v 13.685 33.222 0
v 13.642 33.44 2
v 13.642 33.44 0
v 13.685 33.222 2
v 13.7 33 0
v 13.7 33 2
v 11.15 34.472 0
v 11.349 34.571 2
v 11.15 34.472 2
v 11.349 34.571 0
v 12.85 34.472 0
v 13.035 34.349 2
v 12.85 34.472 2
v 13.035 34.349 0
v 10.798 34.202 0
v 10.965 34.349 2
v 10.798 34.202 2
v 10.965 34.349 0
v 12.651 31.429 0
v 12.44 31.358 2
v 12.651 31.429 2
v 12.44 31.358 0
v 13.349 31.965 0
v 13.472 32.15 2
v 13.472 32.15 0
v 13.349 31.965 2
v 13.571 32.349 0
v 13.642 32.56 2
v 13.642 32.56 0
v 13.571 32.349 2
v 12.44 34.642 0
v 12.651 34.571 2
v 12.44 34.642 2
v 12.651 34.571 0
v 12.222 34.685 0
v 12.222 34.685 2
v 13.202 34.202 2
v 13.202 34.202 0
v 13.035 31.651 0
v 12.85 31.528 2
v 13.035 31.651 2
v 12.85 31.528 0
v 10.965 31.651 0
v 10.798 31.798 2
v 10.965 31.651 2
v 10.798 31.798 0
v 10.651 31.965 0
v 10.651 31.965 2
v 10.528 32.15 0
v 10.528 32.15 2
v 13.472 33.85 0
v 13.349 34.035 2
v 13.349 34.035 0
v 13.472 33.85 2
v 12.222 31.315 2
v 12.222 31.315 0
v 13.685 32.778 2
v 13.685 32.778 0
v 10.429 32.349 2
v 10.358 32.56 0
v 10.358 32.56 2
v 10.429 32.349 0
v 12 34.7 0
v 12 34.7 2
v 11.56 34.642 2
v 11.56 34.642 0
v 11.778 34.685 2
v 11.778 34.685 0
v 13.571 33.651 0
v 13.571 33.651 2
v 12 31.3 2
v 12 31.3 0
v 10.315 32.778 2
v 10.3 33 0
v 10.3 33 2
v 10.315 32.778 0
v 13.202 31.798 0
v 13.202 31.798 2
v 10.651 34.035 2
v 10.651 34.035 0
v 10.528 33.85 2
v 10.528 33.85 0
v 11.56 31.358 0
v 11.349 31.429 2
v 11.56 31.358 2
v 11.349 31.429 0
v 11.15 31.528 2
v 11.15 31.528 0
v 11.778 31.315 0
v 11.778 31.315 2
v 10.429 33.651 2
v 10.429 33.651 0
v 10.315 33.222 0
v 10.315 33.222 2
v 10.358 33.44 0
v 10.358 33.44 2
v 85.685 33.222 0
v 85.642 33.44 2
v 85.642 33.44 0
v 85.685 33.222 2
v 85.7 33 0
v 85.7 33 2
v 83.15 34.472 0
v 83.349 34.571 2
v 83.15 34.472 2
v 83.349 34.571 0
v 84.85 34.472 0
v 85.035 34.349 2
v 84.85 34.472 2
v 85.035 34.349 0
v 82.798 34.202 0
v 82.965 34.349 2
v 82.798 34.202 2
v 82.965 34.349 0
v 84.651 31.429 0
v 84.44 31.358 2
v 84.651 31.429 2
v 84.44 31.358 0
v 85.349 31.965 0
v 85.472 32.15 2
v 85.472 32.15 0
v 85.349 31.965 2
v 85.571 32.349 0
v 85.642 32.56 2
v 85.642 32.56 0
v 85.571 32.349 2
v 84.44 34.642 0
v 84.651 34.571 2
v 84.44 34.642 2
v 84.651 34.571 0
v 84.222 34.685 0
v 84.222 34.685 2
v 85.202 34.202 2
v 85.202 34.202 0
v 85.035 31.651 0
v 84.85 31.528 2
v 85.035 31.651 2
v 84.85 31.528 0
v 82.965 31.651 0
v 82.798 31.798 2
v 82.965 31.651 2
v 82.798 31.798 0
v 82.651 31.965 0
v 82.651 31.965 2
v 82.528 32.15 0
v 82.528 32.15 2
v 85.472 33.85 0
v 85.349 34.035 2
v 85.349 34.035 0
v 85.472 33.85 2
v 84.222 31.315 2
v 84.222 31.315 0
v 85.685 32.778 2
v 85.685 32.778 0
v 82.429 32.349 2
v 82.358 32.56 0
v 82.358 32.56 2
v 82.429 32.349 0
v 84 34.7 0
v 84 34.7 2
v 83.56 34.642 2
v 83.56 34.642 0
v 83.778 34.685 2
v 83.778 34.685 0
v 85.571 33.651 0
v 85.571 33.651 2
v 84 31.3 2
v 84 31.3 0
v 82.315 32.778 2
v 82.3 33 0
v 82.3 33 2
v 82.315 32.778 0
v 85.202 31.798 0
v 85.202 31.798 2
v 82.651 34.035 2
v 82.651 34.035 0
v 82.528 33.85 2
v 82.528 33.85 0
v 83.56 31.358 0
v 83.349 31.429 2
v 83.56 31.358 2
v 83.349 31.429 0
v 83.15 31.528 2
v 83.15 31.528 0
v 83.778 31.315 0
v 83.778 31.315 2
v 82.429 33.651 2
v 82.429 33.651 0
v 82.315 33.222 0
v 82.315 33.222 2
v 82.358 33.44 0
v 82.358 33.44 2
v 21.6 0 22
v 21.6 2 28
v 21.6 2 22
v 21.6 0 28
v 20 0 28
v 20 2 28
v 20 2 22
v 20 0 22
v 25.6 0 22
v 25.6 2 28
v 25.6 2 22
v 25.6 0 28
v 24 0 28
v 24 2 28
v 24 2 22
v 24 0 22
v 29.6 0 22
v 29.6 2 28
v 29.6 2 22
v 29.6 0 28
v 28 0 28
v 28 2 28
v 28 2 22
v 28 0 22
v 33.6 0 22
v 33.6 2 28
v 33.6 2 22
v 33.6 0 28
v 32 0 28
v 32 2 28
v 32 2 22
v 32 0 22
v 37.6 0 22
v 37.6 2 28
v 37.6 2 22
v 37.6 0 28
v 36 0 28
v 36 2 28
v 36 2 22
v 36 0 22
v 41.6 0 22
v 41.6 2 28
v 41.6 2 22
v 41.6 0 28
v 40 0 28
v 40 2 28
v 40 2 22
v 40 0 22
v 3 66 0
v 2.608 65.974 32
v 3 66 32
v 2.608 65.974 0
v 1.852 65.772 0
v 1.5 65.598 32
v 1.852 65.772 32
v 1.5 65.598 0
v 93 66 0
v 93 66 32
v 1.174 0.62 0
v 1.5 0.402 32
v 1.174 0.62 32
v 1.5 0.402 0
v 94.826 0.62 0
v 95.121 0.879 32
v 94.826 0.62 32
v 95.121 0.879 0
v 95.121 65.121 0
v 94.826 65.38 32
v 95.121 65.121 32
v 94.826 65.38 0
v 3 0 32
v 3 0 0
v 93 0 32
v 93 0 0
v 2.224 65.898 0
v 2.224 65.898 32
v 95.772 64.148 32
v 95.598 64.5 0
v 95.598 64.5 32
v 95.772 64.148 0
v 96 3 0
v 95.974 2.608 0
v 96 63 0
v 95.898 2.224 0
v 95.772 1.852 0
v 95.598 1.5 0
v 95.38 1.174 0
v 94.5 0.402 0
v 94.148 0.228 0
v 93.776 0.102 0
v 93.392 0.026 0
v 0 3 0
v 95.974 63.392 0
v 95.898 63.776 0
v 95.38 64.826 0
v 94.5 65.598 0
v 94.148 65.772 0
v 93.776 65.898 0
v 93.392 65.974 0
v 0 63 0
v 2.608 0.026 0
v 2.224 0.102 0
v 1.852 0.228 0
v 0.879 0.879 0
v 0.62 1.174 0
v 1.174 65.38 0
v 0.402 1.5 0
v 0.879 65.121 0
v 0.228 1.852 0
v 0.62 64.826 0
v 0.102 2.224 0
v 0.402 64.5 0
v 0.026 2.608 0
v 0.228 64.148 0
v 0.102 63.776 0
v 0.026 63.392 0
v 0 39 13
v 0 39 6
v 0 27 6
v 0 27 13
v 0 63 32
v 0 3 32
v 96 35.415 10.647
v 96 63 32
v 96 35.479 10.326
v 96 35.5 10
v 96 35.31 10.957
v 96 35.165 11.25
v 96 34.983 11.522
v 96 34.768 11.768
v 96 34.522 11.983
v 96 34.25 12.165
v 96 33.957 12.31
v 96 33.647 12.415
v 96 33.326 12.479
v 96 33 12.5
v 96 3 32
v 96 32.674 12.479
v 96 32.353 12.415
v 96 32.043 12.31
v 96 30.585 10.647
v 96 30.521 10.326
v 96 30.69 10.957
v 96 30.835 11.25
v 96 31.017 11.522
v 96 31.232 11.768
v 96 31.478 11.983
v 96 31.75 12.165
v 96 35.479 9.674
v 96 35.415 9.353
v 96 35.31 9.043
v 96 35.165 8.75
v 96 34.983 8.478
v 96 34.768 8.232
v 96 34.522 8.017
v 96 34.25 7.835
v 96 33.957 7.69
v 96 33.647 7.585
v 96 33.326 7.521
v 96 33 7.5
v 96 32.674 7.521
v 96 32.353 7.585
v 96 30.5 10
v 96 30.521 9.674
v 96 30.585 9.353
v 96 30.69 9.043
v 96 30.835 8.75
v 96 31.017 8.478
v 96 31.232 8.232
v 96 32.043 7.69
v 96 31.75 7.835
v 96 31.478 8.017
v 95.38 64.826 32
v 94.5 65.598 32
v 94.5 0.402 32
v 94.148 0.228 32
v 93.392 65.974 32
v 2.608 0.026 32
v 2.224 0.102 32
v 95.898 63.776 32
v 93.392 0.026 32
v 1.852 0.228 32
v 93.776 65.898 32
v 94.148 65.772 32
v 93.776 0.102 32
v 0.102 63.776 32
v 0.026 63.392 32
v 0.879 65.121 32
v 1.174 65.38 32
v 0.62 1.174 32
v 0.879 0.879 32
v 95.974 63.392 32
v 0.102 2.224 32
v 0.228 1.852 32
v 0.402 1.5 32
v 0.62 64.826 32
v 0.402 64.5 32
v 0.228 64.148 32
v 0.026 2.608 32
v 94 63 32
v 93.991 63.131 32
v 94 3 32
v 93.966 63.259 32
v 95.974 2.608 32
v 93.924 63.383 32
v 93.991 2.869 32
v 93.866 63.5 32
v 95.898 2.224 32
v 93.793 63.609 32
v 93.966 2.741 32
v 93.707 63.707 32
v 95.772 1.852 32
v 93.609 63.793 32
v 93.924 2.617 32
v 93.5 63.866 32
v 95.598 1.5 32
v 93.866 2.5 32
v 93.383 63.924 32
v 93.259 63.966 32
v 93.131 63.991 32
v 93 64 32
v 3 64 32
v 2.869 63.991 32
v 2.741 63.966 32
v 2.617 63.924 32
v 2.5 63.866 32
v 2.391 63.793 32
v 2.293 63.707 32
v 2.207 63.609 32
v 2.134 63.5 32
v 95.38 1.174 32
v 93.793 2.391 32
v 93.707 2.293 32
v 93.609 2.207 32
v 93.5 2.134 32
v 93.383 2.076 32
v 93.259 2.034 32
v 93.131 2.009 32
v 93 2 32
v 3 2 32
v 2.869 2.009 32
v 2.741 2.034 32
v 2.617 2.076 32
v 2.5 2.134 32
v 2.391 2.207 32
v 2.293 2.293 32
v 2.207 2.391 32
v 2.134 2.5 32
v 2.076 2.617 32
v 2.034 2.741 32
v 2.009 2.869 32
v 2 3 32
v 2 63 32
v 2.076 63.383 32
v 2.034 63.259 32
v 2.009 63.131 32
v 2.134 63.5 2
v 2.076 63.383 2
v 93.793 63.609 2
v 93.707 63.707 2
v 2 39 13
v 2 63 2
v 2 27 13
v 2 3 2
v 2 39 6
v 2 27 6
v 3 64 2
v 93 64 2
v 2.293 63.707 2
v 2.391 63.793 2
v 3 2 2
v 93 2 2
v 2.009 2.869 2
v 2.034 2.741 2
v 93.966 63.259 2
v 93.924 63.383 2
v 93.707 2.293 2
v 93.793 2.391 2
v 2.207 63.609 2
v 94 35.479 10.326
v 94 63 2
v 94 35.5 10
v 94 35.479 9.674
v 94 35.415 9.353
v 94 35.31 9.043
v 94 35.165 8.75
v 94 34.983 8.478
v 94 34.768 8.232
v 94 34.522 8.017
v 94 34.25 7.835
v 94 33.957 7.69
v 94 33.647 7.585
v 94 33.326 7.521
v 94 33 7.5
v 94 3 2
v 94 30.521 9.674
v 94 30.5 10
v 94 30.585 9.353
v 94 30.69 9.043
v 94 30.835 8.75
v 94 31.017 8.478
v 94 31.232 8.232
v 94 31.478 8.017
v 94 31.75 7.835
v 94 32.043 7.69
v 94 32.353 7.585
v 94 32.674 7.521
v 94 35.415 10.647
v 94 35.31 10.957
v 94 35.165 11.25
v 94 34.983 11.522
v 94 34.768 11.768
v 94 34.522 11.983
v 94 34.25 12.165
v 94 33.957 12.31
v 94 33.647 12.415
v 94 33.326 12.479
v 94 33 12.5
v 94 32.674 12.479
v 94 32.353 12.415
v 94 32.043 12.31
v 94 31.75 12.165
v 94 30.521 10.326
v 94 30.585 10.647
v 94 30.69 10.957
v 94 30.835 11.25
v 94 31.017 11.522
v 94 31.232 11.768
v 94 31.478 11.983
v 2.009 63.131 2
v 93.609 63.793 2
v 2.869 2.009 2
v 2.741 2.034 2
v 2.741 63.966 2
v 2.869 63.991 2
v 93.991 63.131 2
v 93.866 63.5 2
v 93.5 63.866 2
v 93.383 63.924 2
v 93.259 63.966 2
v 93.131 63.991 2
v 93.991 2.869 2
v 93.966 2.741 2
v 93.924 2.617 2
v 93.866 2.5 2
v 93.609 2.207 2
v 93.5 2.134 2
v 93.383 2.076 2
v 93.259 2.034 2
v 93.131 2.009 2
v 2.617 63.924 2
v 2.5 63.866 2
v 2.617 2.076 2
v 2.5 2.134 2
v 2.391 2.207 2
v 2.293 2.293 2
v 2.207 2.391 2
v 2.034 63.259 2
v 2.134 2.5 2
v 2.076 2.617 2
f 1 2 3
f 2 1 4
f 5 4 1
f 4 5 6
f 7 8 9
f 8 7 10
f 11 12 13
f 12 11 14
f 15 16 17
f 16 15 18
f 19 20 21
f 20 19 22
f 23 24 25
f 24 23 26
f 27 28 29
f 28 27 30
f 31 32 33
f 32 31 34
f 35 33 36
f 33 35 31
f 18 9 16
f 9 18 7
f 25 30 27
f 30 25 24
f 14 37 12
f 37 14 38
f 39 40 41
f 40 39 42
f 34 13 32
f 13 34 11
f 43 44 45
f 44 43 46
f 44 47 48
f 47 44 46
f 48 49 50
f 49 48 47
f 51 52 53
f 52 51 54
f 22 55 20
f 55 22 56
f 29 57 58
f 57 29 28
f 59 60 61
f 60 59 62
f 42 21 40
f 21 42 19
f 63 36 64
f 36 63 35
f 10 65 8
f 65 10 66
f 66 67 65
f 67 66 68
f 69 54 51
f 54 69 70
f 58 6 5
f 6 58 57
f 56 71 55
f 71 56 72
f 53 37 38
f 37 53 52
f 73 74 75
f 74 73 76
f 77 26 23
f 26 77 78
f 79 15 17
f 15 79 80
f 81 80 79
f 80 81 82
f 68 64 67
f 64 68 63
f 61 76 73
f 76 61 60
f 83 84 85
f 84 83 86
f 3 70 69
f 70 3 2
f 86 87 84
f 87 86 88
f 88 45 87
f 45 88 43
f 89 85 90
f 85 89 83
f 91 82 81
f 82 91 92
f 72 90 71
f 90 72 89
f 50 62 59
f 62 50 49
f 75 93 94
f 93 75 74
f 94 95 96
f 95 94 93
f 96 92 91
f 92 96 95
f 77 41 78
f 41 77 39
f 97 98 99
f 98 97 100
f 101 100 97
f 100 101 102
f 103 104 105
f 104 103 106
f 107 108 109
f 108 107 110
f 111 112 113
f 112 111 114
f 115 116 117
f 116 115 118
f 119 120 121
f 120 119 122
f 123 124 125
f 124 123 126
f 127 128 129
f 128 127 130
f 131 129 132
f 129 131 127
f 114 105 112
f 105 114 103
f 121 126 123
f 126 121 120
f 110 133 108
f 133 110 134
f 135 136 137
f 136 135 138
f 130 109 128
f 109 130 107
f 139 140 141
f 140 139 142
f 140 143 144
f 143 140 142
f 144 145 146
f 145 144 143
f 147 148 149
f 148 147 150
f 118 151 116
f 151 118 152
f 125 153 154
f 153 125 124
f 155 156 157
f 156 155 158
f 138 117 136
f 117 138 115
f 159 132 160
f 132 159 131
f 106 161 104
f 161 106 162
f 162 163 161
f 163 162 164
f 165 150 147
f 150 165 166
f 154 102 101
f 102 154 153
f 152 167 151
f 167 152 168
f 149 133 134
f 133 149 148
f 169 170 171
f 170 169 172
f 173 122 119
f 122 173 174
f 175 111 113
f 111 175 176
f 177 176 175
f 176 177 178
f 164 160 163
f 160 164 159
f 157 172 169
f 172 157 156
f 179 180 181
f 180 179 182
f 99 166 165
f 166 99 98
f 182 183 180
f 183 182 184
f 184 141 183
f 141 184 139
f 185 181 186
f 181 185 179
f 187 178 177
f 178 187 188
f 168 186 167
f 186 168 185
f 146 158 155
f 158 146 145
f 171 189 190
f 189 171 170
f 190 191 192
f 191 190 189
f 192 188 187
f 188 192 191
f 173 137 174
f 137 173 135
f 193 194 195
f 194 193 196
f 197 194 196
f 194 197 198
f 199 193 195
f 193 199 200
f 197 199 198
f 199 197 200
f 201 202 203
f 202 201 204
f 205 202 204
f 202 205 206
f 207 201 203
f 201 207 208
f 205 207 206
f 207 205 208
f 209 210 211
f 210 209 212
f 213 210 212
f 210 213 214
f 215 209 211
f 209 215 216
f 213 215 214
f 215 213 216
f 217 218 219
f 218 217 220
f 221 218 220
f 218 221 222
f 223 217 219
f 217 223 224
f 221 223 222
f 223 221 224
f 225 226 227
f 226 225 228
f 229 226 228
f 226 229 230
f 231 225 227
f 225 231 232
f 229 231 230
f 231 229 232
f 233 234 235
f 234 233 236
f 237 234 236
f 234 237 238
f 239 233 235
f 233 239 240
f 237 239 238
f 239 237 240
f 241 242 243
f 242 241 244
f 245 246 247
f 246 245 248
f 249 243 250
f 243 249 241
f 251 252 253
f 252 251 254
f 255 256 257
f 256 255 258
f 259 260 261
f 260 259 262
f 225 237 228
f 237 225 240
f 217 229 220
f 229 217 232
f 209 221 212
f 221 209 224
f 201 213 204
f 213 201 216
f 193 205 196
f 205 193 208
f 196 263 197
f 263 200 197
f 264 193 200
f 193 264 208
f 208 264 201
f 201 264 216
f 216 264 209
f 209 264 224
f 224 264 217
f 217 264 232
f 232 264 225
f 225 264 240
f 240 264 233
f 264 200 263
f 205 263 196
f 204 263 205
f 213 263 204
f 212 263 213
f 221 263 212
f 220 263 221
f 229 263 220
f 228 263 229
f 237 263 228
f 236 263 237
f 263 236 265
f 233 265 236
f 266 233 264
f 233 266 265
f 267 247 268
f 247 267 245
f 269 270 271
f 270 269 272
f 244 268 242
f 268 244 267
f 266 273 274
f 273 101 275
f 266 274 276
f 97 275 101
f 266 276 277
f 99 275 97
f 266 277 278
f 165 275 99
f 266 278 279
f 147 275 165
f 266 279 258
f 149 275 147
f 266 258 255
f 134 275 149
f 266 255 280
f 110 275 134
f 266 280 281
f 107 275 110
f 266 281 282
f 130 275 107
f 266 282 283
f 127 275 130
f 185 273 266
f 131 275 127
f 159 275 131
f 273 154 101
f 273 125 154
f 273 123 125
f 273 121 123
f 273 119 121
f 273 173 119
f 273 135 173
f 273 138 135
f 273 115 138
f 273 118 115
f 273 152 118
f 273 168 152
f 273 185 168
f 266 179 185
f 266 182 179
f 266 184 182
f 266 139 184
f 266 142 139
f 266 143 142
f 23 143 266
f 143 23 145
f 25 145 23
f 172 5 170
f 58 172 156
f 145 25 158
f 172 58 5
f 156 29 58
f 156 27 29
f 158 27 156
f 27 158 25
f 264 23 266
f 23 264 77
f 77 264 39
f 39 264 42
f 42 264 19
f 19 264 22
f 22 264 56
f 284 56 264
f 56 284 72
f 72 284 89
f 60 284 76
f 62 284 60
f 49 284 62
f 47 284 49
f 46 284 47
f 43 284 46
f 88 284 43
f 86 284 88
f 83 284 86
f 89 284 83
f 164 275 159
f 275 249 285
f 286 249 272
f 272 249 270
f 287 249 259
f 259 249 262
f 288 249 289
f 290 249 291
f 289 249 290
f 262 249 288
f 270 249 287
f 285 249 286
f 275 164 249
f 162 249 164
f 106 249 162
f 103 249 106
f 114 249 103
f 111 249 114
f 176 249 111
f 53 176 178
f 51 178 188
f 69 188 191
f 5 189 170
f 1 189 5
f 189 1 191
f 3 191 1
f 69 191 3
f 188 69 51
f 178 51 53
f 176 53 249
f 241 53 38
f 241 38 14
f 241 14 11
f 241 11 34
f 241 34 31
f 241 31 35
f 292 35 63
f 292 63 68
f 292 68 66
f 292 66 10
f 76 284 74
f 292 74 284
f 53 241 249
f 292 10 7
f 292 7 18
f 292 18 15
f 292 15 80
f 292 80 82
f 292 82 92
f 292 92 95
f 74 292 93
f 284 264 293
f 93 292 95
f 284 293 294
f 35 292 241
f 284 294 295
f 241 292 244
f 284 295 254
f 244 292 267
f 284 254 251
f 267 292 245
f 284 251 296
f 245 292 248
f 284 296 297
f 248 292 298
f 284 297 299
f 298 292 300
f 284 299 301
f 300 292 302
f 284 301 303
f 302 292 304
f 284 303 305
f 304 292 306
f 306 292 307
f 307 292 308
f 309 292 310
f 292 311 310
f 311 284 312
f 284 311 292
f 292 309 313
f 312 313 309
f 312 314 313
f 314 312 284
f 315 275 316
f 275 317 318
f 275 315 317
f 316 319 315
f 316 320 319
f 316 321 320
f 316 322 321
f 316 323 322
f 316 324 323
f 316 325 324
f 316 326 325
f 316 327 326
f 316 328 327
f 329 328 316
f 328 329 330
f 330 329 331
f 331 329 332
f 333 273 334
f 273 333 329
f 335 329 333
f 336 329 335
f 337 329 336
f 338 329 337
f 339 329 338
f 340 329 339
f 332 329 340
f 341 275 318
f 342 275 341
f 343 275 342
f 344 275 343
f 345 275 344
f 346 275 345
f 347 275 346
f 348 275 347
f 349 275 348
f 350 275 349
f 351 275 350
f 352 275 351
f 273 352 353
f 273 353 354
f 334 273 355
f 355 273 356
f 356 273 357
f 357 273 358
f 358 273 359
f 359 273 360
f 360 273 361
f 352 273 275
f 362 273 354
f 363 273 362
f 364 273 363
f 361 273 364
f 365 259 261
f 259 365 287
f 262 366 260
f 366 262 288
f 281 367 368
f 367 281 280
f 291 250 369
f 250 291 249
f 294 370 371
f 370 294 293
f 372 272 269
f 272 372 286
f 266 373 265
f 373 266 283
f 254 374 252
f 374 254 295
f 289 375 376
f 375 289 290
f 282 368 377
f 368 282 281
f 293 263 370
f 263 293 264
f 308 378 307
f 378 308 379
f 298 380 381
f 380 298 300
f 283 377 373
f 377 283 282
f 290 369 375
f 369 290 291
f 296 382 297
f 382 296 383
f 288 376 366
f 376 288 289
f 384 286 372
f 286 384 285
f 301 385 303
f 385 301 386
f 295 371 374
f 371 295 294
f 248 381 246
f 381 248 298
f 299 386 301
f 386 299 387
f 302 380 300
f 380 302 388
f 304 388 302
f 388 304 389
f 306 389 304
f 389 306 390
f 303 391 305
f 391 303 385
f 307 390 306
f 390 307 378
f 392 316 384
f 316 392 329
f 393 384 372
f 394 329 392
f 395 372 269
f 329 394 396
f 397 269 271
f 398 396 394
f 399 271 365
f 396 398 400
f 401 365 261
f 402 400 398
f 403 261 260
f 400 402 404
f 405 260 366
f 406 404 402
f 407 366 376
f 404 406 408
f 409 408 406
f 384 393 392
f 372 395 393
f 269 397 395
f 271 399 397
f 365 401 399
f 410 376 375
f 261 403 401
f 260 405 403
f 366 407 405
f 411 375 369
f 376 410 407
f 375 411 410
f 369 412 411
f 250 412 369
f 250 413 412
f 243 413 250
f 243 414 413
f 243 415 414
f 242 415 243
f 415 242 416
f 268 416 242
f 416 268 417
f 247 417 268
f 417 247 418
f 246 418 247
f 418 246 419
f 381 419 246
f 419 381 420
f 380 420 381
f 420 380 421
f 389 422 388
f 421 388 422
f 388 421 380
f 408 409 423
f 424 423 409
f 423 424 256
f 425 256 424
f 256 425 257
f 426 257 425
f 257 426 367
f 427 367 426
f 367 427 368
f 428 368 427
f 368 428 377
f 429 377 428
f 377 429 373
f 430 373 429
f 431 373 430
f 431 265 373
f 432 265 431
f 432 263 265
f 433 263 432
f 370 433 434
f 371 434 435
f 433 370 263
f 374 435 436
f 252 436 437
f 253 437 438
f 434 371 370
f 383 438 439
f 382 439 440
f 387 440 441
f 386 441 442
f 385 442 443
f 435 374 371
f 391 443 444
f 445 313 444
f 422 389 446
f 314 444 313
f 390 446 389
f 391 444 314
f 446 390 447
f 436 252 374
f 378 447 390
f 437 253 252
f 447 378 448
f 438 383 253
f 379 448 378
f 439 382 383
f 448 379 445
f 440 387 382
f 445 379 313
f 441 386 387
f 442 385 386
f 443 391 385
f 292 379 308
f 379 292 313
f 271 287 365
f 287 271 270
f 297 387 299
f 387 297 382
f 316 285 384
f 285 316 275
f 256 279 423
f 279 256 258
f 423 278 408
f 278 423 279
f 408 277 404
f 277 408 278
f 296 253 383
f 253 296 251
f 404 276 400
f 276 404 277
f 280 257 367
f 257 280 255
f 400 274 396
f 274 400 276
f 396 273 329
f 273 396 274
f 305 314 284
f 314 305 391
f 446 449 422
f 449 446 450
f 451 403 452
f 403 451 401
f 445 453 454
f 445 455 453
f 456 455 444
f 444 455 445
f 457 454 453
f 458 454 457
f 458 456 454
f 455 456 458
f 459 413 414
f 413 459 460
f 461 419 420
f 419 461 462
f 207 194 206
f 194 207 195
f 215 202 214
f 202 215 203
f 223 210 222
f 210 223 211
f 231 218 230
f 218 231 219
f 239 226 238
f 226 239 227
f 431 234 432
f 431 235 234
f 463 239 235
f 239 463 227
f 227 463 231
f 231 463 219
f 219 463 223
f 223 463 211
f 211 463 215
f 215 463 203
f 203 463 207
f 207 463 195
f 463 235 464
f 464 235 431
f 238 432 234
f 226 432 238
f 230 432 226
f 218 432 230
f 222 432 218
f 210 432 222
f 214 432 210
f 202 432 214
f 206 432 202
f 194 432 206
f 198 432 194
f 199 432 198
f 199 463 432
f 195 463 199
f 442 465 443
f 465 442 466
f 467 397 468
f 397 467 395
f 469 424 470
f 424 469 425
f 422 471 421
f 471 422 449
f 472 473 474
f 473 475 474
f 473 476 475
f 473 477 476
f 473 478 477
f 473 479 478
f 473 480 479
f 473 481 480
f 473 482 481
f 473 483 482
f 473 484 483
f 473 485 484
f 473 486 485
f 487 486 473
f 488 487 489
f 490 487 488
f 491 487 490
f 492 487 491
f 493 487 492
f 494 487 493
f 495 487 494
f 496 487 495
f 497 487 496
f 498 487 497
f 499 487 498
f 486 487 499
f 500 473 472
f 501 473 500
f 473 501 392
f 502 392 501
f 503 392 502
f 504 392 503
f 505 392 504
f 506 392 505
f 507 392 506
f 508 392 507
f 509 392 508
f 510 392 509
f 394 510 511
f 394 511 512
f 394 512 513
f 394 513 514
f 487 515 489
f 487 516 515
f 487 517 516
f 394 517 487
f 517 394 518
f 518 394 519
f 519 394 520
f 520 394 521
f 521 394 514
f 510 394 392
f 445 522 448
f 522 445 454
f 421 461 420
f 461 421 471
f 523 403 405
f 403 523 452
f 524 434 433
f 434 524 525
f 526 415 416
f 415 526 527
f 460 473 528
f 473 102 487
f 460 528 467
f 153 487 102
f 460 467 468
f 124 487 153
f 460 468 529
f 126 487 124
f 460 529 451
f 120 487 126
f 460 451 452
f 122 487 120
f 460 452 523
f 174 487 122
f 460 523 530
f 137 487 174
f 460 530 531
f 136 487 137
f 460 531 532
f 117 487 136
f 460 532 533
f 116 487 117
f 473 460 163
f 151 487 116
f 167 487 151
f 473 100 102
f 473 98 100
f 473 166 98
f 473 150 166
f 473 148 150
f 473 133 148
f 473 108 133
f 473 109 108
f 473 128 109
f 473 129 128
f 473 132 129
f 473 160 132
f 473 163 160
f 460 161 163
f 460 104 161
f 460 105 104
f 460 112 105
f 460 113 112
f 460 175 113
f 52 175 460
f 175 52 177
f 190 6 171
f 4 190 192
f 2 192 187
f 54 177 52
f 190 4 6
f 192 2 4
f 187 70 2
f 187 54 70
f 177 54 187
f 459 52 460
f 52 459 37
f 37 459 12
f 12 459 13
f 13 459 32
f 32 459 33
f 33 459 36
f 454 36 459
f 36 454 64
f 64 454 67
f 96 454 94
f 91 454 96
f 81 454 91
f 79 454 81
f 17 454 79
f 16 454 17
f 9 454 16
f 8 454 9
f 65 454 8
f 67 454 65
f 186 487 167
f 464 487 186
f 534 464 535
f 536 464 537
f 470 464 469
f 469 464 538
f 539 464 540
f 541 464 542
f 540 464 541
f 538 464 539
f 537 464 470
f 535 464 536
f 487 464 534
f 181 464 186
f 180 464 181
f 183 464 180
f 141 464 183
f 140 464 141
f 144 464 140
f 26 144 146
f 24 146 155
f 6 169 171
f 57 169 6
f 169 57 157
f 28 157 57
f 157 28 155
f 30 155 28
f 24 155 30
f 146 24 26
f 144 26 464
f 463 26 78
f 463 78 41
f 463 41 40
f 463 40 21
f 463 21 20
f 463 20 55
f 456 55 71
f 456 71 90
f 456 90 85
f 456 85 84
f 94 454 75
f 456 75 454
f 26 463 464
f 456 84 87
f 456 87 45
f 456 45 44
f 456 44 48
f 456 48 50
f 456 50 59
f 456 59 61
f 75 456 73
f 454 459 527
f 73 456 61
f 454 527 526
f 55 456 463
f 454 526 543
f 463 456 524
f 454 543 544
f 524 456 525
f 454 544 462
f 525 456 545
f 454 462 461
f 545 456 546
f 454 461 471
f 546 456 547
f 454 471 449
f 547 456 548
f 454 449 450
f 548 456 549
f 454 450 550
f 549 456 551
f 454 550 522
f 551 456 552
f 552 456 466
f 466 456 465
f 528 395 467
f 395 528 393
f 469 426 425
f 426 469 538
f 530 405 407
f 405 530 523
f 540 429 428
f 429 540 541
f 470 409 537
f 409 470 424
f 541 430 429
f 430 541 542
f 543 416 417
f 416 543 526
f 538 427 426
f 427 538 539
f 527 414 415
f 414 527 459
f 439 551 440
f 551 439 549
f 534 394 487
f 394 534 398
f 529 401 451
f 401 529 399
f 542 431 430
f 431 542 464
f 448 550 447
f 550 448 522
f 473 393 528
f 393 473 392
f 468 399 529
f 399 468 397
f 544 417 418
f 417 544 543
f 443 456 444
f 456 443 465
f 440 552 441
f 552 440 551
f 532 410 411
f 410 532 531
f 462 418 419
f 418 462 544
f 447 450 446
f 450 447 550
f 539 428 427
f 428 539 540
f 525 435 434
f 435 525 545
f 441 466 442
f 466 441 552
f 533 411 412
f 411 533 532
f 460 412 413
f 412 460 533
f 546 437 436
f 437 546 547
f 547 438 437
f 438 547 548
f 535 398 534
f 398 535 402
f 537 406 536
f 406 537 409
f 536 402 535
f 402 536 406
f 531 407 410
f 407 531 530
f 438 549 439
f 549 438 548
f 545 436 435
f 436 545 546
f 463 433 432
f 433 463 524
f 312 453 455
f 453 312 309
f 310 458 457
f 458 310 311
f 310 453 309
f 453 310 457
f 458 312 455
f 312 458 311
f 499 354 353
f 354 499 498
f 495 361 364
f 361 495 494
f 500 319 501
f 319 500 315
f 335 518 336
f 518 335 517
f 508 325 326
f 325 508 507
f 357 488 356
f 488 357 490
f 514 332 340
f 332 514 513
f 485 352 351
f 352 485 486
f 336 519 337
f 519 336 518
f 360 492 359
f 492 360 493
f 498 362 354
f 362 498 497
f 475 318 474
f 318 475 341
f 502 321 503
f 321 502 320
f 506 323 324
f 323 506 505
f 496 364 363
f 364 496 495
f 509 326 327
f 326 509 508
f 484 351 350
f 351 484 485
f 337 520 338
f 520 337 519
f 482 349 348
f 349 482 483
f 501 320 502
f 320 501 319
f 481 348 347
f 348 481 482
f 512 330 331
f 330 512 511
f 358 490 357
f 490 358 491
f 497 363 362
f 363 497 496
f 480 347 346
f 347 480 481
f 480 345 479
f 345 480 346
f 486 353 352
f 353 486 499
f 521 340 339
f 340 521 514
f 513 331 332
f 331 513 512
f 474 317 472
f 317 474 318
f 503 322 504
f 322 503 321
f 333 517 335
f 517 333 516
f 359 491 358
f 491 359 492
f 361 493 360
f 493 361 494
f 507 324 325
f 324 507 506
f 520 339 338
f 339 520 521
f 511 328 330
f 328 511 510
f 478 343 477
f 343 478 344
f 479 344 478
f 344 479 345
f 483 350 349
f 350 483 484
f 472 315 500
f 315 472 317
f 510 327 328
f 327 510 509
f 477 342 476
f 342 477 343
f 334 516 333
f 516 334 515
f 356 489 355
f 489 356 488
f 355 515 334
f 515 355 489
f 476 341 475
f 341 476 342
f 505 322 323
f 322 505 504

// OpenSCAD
// Meter Sakshi electronics box: ESP32 DevKit, 18650 UPS module and screw terminals.
// Mounts on the wall NEXT TO the meter box (never inside a sealed meter enclosure).
// Units: mm. Render: openscad -o box.stl -D part=\"box\" electronics-box.scad

part = "box";             // "box" or "lid"

inner_w = 92;             // fits a 30-pin ESP32 DevKit (~55 x 28) beside an 18650 UPS board
inner_d = 62;
inner_h = 30;
wall = 2;
floor_t = 2;
corner_r = 3;
usb_w = 12;               // USB inlet for the household 5 V adapter
usb_h = 7;
cable_d = 5;              // sensor cable from the clip
screw_d = 3.4;            // wall-mount screw holes
vent_w = 1.6;

$fn = 48;

module rounded_box(w, d, h, r) {
  hull() for (x = [r, w - r], y = [r, d - r]) translate([x, y, 0]) cylinder(r = r, h = h);
}

module box() {
  w = inner_w + 2 * wall;
  d = inner_d + 2 * wall;
  difference() {
    rounded_box(w, d, inner_h + floor_t, corner_r);
    translate([wall, wall, floor_t]) rounded_box(inner_w, inner_d, inner_h + 1, max(corner_r - wall, 0.5));
    // USB inlet (left wall)
    translate([-0.01, d / 2 - usb_w / 2, floor_t + 4]) cube([wall + 0.02, usb_w, usb_h]);
    // sensor cable (right wall)
    translate([w - wall - 0.01, d / 2, floor_t + 8]) rotate([0, 90, 0]) cylinder(d = cable_d, h = wall + 0.02);
    // wall-mount holes
    for (x = [12, w - 12]) translate([x, d / 2, -0.01]) cylinder(d = screw_d, h = floor_t + 0.02);
    // vents for the charger
    for (i = [0:5]) translate([20 + i * 4, -0.01, floor_t + inner_h - 10]) cube([vent_w, wall + 0.02, 6]);
  }
}

module lid() {
  w = inner_w + 2 * wall;
  d = inner_d + 2 * wall;
  rounded_box(w, d, 2, corner_r);
  translate([wall + 0.3, wall + 0.3, 2]) difference() {
    rounded_box(inner_w - 0.6, inner_d - 0.6, 3, max(corner_r - wall, 0.5));
    translate([1.2, 1.2, -0.01]) rounded_box(inner_w - 3, inner_d - 3, 3.02, 0.5);
  }
}

if (part == "lid") lid(); else box();
